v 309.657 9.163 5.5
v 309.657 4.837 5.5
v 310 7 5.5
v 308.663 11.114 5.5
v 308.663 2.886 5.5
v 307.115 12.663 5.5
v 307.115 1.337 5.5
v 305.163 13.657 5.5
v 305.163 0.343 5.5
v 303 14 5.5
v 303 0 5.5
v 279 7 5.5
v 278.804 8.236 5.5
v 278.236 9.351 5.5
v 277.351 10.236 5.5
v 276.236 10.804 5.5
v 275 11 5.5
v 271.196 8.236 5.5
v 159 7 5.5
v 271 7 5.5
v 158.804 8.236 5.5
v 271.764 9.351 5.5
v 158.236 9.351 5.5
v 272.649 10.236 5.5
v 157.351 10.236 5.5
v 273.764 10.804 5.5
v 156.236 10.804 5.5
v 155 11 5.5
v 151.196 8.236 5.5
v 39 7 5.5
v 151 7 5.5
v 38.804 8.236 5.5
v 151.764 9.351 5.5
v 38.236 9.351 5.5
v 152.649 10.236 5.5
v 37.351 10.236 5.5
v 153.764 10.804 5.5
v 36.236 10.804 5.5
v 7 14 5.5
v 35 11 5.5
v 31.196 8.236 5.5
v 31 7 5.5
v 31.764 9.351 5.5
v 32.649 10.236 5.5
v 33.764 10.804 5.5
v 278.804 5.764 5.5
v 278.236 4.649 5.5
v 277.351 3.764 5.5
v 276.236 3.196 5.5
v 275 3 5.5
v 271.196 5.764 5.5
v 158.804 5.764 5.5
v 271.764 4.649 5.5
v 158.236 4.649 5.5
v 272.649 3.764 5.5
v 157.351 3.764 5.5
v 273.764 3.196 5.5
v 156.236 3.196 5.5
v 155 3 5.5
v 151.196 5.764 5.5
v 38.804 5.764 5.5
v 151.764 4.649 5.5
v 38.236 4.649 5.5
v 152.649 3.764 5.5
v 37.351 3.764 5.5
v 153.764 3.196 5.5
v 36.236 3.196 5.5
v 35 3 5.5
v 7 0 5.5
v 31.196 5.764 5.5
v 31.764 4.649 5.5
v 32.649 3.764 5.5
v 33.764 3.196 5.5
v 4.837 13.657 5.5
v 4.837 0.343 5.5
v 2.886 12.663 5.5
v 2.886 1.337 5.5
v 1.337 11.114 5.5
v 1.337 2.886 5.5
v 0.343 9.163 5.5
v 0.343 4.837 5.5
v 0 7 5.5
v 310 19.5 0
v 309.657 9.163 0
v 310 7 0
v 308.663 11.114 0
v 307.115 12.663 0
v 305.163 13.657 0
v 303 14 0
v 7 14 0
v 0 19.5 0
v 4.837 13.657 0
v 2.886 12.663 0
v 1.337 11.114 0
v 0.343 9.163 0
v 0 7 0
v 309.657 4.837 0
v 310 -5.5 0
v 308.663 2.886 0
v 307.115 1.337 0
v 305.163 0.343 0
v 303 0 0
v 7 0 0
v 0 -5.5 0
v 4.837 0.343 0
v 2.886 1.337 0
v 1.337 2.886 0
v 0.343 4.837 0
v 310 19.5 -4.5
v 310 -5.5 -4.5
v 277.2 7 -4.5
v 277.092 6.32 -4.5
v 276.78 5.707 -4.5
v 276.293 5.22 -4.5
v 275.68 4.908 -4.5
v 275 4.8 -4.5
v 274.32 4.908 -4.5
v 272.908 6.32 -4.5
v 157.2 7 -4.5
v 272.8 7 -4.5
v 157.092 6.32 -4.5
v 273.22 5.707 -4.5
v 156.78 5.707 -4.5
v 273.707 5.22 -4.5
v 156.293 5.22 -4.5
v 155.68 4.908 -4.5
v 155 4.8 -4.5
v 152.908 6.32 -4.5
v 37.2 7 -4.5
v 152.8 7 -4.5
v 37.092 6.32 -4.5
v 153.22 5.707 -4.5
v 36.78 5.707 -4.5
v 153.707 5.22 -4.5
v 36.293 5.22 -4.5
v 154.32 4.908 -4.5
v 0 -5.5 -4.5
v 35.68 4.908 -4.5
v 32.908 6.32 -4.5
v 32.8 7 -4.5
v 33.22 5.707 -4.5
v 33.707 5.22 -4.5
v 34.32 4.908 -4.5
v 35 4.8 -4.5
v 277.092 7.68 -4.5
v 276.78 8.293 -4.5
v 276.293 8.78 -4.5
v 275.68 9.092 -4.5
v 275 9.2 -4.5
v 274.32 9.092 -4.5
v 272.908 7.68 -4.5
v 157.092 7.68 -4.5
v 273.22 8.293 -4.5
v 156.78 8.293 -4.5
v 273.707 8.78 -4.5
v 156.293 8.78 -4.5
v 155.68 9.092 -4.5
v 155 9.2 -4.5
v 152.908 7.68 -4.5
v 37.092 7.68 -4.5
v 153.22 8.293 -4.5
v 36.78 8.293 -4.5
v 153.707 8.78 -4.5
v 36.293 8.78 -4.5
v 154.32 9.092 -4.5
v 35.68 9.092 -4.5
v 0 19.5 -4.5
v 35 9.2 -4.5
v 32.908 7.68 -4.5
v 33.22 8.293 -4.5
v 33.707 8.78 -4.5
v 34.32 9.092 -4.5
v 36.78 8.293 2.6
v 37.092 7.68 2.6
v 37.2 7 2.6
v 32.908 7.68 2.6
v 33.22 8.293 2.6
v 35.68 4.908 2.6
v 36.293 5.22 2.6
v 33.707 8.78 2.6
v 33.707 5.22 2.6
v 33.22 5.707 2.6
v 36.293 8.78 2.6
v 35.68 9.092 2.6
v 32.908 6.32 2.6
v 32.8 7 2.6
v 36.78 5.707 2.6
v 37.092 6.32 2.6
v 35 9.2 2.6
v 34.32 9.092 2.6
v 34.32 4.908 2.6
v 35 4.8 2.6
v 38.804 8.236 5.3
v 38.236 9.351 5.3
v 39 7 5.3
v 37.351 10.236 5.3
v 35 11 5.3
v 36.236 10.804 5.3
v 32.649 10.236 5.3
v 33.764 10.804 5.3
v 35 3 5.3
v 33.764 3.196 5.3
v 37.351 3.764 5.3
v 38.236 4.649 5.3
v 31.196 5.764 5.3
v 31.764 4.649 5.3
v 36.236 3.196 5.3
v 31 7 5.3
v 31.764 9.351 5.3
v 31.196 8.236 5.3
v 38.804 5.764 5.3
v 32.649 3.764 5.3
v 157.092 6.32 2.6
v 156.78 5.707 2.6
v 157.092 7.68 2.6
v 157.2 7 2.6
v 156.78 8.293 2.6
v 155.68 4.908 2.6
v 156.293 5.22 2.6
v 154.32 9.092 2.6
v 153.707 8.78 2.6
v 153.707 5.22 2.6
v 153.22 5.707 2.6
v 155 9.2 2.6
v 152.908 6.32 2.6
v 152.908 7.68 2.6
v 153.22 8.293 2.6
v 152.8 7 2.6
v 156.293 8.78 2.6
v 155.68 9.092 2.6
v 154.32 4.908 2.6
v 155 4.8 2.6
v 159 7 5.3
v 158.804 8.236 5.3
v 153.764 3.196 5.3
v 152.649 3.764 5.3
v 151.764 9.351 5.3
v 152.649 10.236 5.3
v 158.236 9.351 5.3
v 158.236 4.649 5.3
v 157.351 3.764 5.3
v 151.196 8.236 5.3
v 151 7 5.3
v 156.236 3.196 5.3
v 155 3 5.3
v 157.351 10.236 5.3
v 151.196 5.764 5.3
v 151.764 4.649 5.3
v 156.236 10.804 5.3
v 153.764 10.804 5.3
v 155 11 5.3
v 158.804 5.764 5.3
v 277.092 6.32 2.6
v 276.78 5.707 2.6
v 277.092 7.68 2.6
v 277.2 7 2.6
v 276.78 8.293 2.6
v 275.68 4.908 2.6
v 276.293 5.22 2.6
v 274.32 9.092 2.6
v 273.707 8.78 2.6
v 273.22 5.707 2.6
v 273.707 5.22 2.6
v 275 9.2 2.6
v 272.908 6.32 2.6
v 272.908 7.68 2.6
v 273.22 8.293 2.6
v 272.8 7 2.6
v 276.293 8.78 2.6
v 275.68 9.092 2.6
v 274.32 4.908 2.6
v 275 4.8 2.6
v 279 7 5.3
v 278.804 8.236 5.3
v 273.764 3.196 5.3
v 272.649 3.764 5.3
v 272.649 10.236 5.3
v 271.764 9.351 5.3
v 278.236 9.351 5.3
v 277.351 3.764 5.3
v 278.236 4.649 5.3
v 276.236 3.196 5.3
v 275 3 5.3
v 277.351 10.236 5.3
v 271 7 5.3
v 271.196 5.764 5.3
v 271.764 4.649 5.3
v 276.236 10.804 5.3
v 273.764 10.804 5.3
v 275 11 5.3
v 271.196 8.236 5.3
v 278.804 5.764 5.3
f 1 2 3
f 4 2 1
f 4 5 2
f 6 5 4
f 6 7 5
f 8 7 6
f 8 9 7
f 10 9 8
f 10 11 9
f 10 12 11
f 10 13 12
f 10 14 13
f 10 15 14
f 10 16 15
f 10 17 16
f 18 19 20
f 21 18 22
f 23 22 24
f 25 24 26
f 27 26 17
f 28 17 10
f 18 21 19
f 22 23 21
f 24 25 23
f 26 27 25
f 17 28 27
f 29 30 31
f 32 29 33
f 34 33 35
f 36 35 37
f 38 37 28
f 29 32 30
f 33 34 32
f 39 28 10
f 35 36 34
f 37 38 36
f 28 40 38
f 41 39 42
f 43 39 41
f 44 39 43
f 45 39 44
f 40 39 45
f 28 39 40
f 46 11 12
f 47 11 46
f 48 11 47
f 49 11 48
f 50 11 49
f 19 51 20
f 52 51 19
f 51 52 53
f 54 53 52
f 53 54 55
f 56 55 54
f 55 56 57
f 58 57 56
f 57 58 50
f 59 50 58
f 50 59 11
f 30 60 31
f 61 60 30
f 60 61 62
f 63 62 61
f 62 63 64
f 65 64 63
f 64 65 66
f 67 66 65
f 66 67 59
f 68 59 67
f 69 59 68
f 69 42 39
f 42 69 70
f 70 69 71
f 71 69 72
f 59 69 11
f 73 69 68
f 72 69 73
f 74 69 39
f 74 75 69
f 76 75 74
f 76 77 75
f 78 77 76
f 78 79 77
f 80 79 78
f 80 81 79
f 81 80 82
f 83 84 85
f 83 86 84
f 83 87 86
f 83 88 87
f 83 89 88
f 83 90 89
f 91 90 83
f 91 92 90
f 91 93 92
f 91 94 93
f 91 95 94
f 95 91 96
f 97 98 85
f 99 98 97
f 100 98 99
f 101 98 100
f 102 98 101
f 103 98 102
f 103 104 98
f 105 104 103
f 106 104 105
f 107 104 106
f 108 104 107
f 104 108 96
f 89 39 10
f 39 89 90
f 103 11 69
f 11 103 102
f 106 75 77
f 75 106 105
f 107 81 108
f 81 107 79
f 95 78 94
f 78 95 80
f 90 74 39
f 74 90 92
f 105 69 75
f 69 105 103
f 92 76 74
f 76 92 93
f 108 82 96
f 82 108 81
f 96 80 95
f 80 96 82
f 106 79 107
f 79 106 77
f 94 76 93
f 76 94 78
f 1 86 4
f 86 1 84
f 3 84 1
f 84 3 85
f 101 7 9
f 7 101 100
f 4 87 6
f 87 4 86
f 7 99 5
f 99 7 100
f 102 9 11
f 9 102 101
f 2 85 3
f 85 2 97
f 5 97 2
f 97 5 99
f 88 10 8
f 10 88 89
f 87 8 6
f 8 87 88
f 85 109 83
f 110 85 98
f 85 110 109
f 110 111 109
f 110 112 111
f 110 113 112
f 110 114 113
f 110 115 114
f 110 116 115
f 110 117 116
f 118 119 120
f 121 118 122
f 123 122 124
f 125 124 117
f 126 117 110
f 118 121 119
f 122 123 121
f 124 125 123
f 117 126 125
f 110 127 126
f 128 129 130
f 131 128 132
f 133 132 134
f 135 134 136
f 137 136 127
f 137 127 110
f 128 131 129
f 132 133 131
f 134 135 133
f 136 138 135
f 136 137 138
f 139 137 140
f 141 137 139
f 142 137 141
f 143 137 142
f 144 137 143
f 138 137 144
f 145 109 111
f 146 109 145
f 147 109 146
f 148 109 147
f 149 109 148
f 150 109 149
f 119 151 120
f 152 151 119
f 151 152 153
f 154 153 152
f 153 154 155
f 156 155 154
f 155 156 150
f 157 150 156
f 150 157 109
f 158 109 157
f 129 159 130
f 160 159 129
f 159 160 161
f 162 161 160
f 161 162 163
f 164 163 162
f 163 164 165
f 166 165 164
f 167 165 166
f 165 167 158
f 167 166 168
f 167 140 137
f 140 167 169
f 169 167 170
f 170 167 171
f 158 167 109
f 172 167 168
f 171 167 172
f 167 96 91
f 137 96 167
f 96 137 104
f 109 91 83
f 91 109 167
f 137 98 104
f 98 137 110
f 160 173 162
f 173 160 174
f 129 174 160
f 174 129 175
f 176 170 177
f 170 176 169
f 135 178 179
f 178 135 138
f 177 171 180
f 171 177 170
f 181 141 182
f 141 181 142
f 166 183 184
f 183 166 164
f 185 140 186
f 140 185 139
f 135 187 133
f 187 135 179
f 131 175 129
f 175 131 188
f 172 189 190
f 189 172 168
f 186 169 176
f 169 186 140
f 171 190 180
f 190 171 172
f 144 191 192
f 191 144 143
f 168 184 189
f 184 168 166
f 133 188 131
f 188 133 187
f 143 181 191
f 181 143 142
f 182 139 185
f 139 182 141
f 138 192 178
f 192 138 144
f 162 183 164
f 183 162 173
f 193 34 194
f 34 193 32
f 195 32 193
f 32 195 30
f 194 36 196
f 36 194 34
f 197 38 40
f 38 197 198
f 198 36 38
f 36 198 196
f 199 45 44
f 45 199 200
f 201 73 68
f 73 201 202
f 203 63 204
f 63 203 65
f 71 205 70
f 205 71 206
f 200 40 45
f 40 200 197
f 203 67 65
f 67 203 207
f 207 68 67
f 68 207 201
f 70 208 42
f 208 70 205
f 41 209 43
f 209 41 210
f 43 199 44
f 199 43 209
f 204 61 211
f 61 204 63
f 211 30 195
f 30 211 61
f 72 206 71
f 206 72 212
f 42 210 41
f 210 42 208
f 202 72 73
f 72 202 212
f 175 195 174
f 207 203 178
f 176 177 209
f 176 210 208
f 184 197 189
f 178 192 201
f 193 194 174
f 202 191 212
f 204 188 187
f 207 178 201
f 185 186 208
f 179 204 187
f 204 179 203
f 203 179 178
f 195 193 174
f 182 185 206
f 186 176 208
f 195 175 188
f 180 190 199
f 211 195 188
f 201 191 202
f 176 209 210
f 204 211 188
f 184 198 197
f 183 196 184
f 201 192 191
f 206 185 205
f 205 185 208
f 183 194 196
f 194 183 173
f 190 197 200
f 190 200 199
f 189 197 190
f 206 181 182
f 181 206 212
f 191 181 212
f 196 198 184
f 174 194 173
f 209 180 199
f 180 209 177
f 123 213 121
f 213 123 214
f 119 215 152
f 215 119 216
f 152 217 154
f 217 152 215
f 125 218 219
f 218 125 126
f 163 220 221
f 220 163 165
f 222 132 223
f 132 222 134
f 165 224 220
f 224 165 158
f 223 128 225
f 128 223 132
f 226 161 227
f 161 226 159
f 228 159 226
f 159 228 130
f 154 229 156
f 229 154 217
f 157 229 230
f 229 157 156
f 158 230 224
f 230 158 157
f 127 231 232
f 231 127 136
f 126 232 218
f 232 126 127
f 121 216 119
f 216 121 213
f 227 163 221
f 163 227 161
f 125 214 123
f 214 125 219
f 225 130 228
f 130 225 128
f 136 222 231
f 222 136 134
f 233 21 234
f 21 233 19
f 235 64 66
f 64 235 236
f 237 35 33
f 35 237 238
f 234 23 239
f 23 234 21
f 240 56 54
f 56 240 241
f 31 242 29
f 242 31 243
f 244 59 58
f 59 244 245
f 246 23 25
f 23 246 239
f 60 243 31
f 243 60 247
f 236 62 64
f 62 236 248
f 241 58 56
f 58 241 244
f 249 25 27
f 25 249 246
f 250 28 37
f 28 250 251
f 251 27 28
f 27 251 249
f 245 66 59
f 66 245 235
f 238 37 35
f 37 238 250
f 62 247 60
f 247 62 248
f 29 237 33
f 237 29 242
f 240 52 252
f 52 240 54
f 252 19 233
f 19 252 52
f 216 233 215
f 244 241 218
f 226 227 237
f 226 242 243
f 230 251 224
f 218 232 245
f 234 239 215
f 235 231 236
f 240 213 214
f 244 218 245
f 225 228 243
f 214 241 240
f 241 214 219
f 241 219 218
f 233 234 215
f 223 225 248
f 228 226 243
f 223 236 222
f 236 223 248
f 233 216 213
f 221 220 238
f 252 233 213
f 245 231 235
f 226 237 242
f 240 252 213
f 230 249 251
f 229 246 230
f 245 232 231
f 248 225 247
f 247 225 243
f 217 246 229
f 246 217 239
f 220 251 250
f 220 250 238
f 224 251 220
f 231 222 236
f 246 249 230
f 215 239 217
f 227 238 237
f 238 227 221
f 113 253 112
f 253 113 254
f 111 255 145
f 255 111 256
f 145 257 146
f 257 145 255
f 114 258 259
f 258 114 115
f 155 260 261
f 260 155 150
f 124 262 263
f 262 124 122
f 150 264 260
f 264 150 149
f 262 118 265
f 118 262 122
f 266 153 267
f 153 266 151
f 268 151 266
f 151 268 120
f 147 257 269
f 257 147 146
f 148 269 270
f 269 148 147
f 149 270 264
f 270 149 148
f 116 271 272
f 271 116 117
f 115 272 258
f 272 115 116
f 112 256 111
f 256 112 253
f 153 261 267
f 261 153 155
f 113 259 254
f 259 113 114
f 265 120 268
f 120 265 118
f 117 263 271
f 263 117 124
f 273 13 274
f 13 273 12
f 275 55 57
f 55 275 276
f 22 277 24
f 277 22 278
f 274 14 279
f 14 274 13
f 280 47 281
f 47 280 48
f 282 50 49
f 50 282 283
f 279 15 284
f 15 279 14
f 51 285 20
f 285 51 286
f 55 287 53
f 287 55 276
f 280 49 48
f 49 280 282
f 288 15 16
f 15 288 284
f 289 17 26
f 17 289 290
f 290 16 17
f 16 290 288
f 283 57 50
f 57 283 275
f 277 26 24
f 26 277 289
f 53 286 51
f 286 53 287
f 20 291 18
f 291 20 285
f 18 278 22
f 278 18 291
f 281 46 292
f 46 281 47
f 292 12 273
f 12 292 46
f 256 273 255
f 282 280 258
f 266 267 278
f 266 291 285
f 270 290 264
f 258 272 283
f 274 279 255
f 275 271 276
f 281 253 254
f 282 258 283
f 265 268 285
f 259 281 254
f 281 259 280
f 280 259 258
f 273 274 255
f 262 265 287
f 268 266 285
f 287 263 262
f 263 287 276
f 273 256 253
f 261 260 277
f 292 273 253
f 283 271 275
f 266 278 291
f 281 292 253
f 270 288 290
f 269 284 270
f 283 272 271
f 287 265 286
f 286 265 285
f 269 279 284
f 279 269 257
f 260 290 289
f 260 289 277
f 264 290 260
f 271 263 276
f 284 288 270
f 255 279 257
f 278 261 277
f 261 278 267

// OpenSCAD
//include <roundedcube.scad>

l = 310;
w = 14;
h = 5.5;

bottom_h = 4.5;
bottom_w = 25;

$fn = 20;

num_holes = 3;
hole_margin = 35;

hole_r = 2.2;
hole_r2 = 4;
screw_head_h = 2.7;
screw_h = h - screw_head_h - 0.2;

corner_radius = w/4;


increment = (l - 2 * hole_margin) / (num_holes-1);

difference() {
    union(){
        //roundedcube([l,w,h],apply_to="z",radius=corner_radius);
        translate([w/2,0,0]) cube([l-w,w,h]);
        translate([w/2,w/2,0])cylinder(h,w/2,w/2);
        translate([l-w/2,w/2,0])cylinder(h,w/2,w/2);
        translate([0,-(bottom_w-w)/2,-bottom_h]) cube([l,bottom_w,bottom_h]);
    }
    for(variable = [hole_margin : increment : (l - hole_margin)]) {
        echo(variable);
        translate([variable,w/2,0]) {
            translate([0,0,-bottom_h])cylinder(h+bottom_h,hole_r,hole_r);
            translate([0,0,screw_h+screw_head_h]) cylinder(h,hole_r2,hole_r2);
            translate([0,0,screw_h]) cylinder(screw_head_h,hole_r,hole_r2);
        }
    }
}
